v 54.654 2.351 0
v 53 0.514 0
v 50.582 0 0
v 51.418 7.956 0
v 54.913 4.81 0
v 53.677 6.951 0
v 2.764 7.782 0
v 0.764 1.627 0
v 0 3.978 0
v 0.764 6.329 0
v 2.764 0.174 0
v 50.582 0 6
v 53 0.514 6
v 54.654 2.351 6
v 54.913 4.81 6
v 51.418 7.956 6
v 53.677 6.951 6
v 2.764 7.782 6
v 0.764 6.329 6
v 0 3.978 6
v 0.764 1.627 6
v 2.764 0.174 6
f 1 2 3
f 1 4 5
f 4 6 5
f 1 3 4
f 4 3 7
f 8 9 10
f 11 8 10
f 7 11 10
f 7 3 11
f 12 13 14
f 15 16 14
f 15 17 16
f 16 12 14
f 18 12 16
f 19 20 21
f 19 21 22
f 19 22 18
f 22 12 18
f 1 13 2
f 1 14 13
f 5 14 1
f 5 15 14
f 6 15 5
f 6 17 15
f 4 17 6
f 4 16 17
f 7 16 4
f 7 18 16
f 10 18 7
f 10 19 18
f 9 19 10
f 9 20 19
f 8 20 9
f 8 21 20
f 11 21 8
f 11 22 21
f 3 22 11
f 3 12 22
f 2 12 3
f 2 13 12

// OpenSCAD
$fn = 32;

// ----------------------------------------------------------------------
// Key bar: parallel key, 6 mm thick
// ----------------------------------------------------------------------

// --- parameters (mm) ---
profile_height = 6;       // extrusion height
profile_points = 11;      // points of the closed outline

profile = [[0, 3.978], [0.764, 1.627], [2.764, 0.174], [50.582, 0], [53, 0.514], [54.654, 2.351], [54.913, 4.81], [53.677, 6.951], [51.418, 7.956], [2.764, 7.782], [0.764, 6.329]];  // single closed polygon, 11 points, counter clockwise

// --- the one profile operation ---
linear_extrude(height = profile_height) polygon(points = profile);
